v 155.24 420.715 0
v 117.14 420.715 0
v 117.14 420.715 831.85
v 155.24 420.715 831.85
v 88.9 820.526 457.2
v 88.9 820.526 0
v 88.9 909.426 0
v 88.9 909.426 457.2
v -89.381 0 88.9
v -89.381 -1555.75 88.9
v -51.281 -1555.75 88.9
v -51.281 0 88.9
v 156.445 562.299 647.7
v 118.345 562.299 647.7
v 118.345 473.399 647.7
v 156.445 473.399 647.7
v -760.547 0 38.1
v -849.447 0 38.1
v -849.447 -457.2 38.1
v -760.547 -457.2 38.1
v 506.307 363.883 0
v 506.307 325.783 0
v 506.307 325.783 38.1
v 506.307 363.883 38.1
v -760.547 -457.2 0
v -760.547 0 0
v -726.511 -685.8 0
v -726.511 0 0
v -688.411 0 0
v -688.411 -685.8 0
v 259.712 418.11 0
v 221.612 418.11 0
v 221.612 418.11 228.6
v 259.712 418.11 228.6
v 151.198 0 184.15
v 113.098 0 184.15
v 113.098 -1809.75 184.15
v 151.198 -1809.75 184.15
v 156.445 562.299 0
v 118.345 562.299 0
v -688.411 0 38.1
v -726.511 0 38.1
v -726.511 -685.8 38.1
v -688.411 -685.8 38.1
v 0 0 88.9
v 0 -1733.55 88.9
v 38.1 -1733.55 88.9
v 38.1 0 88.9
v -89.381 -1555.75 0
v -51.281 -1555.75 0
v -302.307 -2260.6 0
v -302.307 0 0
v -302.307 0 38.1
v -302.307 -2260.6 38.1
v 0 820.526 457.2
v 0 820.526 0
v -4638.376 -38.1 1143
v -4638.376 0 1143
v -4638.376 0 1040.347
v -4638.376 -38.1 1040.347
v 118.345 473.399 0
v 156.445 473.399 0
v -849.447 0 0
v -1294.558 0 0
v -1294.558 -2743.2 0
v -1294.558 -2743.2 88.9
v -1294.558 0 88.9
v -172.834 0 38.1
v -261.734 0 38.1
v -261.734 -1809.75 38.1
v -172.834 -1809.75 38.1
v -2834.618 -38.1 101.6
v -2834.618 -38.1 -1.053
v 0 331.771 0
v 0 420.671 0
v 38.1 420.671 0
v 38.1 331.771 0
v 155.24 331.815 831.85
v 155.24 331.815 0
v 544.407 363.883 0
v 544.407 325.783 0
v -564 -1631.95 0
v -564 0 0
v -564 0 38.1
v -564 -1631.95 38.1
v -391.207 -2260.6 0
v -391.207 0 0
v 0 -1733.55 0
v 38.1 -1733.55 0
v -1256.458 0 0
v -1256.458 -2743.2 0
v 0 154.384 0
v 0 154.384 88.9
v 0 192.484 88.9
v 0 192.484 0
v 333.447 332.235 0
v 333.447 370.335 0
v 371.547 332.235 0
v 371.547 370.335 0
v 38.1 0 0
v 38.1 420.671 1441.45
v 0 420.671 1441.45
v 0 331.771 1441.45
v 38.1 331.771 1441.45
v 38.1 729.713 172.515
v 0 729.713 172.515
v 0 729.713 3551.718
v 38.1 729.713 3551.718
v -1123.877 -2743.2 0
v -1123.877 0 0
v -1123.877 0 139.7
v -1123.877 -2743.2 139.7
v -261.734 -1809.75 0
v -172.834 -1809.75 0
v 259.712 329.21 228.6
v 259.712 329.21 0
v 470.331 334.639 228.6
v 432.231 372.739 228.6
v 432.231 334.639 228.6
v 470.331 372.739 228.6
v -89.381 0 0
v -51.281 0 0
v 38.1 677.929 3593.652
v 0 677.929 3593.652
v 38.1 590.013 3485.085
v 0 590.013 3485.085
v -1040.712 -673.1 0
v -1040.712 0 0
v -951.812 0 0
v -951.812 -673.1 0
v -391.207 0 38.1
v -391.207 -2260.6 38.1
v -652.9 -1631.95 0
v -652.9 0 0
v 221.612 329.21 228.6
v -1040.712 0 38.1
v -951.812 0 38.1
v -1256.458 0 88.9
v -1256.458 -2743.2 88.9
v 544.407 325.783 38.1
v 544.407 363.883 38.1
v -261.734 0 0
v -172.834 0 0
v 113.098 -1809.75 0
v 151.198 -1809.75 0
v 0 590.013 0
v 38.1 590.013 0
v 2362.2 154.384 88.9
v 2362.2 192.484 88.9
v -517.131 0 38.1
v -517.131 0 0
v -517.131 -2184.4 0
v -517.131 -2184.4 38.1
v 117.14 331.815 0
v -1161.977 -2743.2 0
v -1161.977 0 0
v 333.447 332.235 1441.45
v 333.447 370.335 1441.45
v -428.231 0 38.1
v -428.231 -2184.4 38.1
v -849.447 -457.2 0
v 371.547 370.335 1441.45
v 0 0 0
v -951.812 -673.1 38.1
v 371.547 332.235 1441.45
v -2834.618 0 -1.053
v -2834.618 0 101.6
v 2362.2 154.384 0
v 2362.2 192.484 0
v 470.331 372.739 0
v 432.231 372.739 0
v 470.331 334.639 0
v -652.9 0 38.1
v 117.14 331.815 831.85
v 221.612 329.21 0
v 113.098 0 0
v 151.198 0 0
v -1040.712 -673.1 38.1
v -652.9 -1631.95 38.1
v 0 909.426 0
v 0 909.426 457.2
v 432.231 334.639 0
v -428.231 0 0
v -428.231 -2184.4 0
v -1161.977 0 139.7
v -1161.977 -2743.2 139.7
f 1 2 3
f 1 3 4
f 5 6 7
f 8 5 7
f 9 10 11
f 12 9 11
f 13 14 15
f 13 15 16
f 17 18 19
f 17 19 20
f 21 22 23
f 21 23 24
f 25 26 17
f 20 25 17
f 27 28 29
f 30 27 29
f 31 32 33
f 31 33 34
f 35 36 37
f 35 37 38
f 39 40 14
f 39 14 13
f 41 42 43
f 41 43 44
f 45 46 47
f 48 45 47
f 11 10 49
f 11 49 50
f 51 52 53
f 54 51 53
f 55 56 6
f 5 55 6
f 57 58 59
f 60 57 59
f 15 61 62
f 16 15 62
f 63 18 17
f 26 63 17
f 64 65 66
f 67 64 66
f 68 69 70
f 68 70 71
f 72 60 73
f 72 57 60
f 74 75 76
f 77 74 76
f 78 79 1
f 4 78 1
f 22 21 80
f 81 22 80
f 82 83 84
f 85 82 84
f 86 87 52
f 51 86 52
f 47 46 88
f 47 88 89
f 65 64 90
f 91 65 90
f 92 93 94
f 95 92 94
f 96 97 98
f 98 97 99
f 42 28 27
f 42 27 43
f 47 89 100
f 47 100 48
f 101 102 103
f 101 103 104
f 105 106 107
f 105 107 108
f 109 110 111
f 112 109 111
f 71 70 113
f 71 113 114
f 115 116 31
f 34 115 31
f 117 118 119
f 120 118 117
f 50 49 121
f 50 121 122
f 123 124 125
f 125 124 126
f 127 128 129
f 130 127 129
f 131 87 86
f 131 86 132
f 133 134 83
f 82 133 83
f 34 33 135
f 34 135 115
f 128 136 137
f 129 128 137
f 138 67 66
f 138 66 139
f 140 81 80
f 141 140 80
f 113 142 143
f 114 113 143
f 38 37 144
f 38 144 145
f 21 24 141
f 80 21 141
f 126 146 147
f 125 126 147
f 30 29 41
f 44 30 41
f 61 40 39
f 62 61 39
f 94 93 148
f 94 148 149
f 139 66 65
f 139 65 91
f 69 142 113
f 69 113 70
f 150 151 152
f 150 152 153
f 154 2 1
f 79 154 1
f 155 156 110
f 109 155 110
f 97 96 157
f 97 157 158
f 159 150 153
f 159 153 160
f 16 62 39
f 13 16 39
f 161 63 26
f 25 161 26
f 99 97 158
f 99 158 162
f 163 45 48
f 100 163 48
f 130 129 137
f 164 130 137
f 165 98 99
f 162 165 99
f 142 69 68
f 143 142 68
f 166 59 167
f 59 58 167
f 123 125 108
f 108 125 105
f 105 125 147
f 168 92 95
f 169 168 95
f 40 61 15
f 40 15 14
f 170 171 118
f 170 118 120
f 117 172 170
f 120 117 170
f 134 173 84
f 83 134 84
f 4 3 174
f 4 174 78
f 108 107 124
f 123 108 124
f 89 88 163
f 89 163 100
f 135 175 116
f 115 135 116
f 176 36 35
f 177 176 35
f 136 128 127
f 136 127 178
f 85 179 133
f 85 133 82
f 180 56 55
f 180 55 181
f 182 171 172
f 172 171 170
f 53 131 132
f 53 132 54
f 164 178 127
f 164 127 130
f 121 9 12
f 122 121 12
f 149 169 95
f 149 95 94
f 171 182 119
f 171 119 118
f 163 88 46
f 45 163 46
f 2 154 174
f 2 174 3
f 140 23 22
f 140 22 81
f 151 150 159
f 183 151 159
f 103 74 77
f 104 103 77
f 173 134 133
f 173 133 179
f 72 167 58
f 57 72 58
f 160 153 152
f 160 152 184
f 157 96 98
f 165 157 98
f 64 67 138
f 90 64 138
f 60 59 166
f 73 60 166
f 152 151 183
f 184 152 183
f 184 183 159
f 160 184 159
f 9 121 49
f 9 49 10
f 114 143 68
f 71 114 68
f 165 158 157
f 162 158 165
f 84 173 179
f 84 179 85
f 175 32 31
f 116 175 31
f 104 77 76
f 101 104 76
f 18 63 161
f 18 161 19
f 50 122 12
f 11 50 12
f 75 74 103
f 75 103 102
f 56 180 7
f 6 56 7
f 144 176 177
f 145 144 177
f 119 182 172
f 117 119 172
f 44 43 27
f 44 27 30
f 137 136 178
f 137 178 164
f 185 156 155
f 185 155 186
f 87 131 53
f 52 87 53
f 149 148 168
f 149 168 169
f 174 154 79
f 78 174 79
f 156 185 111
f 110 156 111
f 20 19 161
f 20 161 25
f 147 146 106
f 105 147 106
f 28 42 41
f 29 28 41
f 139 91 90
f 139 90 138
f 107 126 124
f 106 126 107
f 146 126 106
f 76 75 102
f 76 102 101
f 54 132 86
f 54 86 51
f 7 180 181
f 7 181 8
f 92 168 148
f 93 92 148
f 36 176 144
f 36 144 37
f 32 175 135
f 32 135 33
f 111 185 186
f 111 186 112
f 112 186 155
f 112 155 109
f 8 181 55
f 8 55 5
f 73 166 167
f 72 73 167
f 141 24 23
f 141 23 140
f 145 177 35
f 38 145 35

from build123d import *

# Parameters (mm, degrees)
F0_W      = 38.1
F0_H      = 88.9
F1_DEPTH  = 1733.55
F2_W      = 38.1
F2_H      = 184.15
F3_DEPTH  = 1809.75
F4_W      = 38.1
F4_H      = 88.9
F5_DEPTH  = 1555.75
F6_W      = 38.1
F6_H      = 88.9
F7_DEPTH  = 2362.2
F8_W      = 88.9
F8_H      = 38.1
F9_DEPTH  = 1809.75
F10_W     = 88.9
F10_H     = 38.1
F11_DEPTH = 2260.6
F12_W     = 38.1
F12_H     = 88.9
F13_DEPTH = 1441.45
F14_W     = 38.1
F14_H     = 139.7
F15_DEPTH = 3657.6
F17_DEPTH = 38.1
F19_DEPTH = 38.1
F20_W     = 88.9
F20_H     = 38.1
F21_DEPTH = 2184.4
F22_W     = 88.9
F22_H     = 38.1
F23_DEPTH = 1631.95
F24_W     = 38.1
F24_H     = 88.9
F25_DEPTH = 831.85
F26_W     = 38.1
F26_H     = 88.9
F27_DEPTH = 228.6
F28_W     = 38.1
F28_H     = 38.1
F29_DEPTH = 1441.45
F30_W     = 38.1
F30_H     = 38.1
F31_DEPTH = 685.8
F32_W     = 88.9
F32_H     = 38.1
F33_DEPTH = 457.2
F34_W     = 88.9
F34_H     = 88.9
F35_DEPTH = 457.2
F36_W     = 38.1
F36_H     = 38.1
F37_DEPTH = 228.6
F38_W     = 38.1
F38_H     = 38.1
F39_DEPTH = 38.1
F41_W     = 88.9
F41_H     = 38.1
F42_DEPTH = 673.1
F43_W     = 38.1
F43_H     = 139.7
F44_DEPTH = 2743.2
F45_DEPTH = 38.1
F46_W     = 38.1
F46_H     = 88.9
F47_DEPTH = 2743.2
F48_W     = 38.1
F48_H     = 88.9
F49_DEPTH = 647.7


with BuildPart() as f1:
    # F0 (on Front) → F1 (new body)
    with BuildSketch(Plane.XZ):
        with Locations((19.05, 44.45)):
            Rectangle(F0_W, F0_H)
    extrude(amount=F1_DEPTH)


with BuildPart() as f3:
    # F2 (on Front) → F3 (new body)
    with BuildSketch(Plane.XZ):
        with Locations((132.148183, 92.075)):
            Rectangle(F2_W, F2_H)
    extrude(amount=F3_DEPTH)


with BuildPart() as f5:
    # F4 (on Front) → F5 (new body)
    with BuildSketch(Plane.XZ):
        with Locations((-70.330999, 44.45)):
            Rectangle(F4_W, F4_H)
    extrude(amount=F5_DEPTH)


with BuildPart() as f7:
    # F6 (on Right) → F7 (new body)
    with BuildSketch(Plane.YZ):
        with Locations((173.433981, 44.45)):
            Rectangle(F6_W, F6_H)
    extrude(amount=F7_DEPTH)


with BuildPart() as f9:
    # F8 (on Front) → F9 (new body)
    with BuildSketch(Plane.XZ):
        with Locations((-217.284162, 19.05)):
            Rectangle(F8_W, F8_H)
    extrude(amount=F9_DEPTH)


with BuildPart() as f11:
    # F10 (on Front) → F11 (new body)
    with BuildSketch(Plane.XZ):
        with Locations((-346.756616, 19.05)):
            Rectangle(F10_W, F10_H)
    extrude(amount=F11_DEPTH)


with BuildPart() as f13:
    # F12 (on Top) → F13 (new body)
    with BuildSketch(Plane.XY):
        with Locations((19.05, 376.220504)):
            Rectangle(F12_W, F12_H)
    extrude(amount=F13_DEPTH)


with BuildPart() as f15:
    # F14 (on Top) → F15 (new body)
    with BuildSketch(Plane.XY):
        with Locations((19.05, 659.862631)):
            Rectangle(F14_W, F14_H)
    extrude(amount=F15_DEPTH)

    # F16 (on face) → F17 (cut)
    with BuildSketch(Plane(origin=(0, 0, 0), x_dir=(0, -1, 0), z_dir=(-1, 0, 0))):
        Polygon((-729.712631, 3657.6), (-590.012631, 3485.084867), (-590.012631, 3657.6), align=None)
        Polygon((-729.712631, 0), (-590.012631, 0), (-729.712631, 172.515133), align=None)
    extrude(amount=-F17_DEPTH, mode=Mode.SUBTRACT)

    # F18 (on face) → F19 (cut)
    with BuildSketch(Plane(origin=(0, 0, 0), x_dir=(0, -1, 0), z_dir=(-1, 0, 0))):
        Polygon((-677.928689, 3593.652158), (-729.712631, 3657.6), (-729.712631, 3551.718349), align=None)
    extrude(amount=-F19_DEPTH, mode=Mode.SUBTRACT)


with BuildPart() as f21:
    # F20 (on Front) → F21 (new body)
    with BuildSketch(Plane.XZ):
        with Locations((-472.680656, 19.05)):
            Rectangle(F20_W, F20_H)
    extrude(amount=F21_DEPTH)


with BuildPart() as f23:
    # F22 (on Front) → F23 (new body)
    with BuildSketch(Plane.XZ):
        with Locations((-608.450331, 19.05)):
            Rectangle(F22_W, F22_H)
    extrude(amount=F23_DEPTH)


with BuildPart() as f25:
    # F24 (on Top) → F25 (new body)
    with BuildSketch(Plane.XY):
        with Locations((136.190138, 376.264662)):
            Rectangle(F24_W, F24_H)
    extrude(amount=F25_DEPTH)


with BuildPart() as f27:
    # F26 (on Top) → F27 (new body)
    with BuildSketch(Plane.XY):
        with Locations((240.661755, 373.660401)):
            Rectangle(F26_W, F26_H)
    extrude(amount=F27_DEPTH)


with BuildPart() as f29:
    # F28 (on Top) → F29 (new body)
    with BuildSketch(Plane.XY):
        with Locations((352.496579, 351.285153)):
            Rectangle(F28_W, F28_H)
    extrude(amount=F29_DEPTH)


with BuildPart() as f31:
    # F30 (on Front) → F31 (new body)
    with BuildSketch(Plane.XZ):
        with Locations((-707.461006, 19.05)):
            Rectangle(F30_W, F30_H)
    extrude(amount=F31_DEPTH)


with BuildPart() as f33:
    # F32 (on Front) → F33 (new body)
    with BuildSketch(Plane.XZ):
        with Locations((-804.996761, 19.05)):
            Rectangle(F32_W, F32_H)
    extrude(amount=F33_DEPTH)


with BuildPart() as f35:
    # F34 (on Top) → F35 (new body)
    with BuildSketch(Plane.XY):
        with Locations((44.45, 864.975778)):
            Rectangle(F34_W, F34_H)
    extrude(amount=F35_DEPTH)


with BuildPart() as f37:
    # F36 (on Top) → F37 (new body)
    with BuildSketch(Plane.XY):
        with Locations((451.281339, 353.689343)):
            Rectangle(F36_W, F36_H)
    extrude(amount=F37_DEPTH)


with BuildPart() as f39:
    # F38 (on Top) → F39 (new body)
    with BuildSketch(Plane.XY):
        with Locations((525.357425, 344.83254)):
            Rectangle(F38_W, F38_H)
    extrude(amount=F39_DEPTH)


with BuildPart() as f42:
    # F41 (on Front) → F42 (new body)
    with BuildSketch(Plane.XZ):
        with Locations((-996.262368, 19.05)):
            Rectangle(F41_W, F41_H)
    extrude(amount=F42_DEPTH)


with BuildPart() as f44:
    # F43 (on Front) → F44 (new body)
    with BuildSketch(Plane.XZ):
        with Locations((-1142.927096, 69.85)):
            Rectangle(F43_W, F43_H)
    extrude(amount=F44_DEPTH)


with BuildPart() as f45:
    # F40 (on Front) → F45 (new body)
    with BuildSketch(Plane.XZ):
        Polygon((-4638.37558, 1040.347122), (-2834.617869, -1.052878), (-2834.617869, 101.6), (-4638.37558, 1143), align=None)
    extrude(amount=F45_DEPTH)


with BuildPart() as f47:
    # F46 (on Front) → F47 (new body)
    with BuildSketch(Plane.XZ):
        with Locations((-1275.508307, 44.45)):
            Rectangle(F46_W, F46_H)
    extrude(amount=F47_DEPTH)


with BuildPart() as f49:
    # F48 (on Top) → F49 (new body)
    with BuildSketch(Plane.XY):
        with Locations((137.394853, 517.849211)):
            Rectangle(F48_W, F48_H)
    extrude(amount=F49_DEPTH)


solid = Compound([f1.part, f3.part, f5.part, f7.part, f9.part, f11.part, f13.part, f15.part, f21.part, f23.part, f25.part, f27.part, f29.part, f31.part, f33.part, f35.part, f37.part, f39.part, f42.part, f44.part, f45.part, f47.part, f49.part])
